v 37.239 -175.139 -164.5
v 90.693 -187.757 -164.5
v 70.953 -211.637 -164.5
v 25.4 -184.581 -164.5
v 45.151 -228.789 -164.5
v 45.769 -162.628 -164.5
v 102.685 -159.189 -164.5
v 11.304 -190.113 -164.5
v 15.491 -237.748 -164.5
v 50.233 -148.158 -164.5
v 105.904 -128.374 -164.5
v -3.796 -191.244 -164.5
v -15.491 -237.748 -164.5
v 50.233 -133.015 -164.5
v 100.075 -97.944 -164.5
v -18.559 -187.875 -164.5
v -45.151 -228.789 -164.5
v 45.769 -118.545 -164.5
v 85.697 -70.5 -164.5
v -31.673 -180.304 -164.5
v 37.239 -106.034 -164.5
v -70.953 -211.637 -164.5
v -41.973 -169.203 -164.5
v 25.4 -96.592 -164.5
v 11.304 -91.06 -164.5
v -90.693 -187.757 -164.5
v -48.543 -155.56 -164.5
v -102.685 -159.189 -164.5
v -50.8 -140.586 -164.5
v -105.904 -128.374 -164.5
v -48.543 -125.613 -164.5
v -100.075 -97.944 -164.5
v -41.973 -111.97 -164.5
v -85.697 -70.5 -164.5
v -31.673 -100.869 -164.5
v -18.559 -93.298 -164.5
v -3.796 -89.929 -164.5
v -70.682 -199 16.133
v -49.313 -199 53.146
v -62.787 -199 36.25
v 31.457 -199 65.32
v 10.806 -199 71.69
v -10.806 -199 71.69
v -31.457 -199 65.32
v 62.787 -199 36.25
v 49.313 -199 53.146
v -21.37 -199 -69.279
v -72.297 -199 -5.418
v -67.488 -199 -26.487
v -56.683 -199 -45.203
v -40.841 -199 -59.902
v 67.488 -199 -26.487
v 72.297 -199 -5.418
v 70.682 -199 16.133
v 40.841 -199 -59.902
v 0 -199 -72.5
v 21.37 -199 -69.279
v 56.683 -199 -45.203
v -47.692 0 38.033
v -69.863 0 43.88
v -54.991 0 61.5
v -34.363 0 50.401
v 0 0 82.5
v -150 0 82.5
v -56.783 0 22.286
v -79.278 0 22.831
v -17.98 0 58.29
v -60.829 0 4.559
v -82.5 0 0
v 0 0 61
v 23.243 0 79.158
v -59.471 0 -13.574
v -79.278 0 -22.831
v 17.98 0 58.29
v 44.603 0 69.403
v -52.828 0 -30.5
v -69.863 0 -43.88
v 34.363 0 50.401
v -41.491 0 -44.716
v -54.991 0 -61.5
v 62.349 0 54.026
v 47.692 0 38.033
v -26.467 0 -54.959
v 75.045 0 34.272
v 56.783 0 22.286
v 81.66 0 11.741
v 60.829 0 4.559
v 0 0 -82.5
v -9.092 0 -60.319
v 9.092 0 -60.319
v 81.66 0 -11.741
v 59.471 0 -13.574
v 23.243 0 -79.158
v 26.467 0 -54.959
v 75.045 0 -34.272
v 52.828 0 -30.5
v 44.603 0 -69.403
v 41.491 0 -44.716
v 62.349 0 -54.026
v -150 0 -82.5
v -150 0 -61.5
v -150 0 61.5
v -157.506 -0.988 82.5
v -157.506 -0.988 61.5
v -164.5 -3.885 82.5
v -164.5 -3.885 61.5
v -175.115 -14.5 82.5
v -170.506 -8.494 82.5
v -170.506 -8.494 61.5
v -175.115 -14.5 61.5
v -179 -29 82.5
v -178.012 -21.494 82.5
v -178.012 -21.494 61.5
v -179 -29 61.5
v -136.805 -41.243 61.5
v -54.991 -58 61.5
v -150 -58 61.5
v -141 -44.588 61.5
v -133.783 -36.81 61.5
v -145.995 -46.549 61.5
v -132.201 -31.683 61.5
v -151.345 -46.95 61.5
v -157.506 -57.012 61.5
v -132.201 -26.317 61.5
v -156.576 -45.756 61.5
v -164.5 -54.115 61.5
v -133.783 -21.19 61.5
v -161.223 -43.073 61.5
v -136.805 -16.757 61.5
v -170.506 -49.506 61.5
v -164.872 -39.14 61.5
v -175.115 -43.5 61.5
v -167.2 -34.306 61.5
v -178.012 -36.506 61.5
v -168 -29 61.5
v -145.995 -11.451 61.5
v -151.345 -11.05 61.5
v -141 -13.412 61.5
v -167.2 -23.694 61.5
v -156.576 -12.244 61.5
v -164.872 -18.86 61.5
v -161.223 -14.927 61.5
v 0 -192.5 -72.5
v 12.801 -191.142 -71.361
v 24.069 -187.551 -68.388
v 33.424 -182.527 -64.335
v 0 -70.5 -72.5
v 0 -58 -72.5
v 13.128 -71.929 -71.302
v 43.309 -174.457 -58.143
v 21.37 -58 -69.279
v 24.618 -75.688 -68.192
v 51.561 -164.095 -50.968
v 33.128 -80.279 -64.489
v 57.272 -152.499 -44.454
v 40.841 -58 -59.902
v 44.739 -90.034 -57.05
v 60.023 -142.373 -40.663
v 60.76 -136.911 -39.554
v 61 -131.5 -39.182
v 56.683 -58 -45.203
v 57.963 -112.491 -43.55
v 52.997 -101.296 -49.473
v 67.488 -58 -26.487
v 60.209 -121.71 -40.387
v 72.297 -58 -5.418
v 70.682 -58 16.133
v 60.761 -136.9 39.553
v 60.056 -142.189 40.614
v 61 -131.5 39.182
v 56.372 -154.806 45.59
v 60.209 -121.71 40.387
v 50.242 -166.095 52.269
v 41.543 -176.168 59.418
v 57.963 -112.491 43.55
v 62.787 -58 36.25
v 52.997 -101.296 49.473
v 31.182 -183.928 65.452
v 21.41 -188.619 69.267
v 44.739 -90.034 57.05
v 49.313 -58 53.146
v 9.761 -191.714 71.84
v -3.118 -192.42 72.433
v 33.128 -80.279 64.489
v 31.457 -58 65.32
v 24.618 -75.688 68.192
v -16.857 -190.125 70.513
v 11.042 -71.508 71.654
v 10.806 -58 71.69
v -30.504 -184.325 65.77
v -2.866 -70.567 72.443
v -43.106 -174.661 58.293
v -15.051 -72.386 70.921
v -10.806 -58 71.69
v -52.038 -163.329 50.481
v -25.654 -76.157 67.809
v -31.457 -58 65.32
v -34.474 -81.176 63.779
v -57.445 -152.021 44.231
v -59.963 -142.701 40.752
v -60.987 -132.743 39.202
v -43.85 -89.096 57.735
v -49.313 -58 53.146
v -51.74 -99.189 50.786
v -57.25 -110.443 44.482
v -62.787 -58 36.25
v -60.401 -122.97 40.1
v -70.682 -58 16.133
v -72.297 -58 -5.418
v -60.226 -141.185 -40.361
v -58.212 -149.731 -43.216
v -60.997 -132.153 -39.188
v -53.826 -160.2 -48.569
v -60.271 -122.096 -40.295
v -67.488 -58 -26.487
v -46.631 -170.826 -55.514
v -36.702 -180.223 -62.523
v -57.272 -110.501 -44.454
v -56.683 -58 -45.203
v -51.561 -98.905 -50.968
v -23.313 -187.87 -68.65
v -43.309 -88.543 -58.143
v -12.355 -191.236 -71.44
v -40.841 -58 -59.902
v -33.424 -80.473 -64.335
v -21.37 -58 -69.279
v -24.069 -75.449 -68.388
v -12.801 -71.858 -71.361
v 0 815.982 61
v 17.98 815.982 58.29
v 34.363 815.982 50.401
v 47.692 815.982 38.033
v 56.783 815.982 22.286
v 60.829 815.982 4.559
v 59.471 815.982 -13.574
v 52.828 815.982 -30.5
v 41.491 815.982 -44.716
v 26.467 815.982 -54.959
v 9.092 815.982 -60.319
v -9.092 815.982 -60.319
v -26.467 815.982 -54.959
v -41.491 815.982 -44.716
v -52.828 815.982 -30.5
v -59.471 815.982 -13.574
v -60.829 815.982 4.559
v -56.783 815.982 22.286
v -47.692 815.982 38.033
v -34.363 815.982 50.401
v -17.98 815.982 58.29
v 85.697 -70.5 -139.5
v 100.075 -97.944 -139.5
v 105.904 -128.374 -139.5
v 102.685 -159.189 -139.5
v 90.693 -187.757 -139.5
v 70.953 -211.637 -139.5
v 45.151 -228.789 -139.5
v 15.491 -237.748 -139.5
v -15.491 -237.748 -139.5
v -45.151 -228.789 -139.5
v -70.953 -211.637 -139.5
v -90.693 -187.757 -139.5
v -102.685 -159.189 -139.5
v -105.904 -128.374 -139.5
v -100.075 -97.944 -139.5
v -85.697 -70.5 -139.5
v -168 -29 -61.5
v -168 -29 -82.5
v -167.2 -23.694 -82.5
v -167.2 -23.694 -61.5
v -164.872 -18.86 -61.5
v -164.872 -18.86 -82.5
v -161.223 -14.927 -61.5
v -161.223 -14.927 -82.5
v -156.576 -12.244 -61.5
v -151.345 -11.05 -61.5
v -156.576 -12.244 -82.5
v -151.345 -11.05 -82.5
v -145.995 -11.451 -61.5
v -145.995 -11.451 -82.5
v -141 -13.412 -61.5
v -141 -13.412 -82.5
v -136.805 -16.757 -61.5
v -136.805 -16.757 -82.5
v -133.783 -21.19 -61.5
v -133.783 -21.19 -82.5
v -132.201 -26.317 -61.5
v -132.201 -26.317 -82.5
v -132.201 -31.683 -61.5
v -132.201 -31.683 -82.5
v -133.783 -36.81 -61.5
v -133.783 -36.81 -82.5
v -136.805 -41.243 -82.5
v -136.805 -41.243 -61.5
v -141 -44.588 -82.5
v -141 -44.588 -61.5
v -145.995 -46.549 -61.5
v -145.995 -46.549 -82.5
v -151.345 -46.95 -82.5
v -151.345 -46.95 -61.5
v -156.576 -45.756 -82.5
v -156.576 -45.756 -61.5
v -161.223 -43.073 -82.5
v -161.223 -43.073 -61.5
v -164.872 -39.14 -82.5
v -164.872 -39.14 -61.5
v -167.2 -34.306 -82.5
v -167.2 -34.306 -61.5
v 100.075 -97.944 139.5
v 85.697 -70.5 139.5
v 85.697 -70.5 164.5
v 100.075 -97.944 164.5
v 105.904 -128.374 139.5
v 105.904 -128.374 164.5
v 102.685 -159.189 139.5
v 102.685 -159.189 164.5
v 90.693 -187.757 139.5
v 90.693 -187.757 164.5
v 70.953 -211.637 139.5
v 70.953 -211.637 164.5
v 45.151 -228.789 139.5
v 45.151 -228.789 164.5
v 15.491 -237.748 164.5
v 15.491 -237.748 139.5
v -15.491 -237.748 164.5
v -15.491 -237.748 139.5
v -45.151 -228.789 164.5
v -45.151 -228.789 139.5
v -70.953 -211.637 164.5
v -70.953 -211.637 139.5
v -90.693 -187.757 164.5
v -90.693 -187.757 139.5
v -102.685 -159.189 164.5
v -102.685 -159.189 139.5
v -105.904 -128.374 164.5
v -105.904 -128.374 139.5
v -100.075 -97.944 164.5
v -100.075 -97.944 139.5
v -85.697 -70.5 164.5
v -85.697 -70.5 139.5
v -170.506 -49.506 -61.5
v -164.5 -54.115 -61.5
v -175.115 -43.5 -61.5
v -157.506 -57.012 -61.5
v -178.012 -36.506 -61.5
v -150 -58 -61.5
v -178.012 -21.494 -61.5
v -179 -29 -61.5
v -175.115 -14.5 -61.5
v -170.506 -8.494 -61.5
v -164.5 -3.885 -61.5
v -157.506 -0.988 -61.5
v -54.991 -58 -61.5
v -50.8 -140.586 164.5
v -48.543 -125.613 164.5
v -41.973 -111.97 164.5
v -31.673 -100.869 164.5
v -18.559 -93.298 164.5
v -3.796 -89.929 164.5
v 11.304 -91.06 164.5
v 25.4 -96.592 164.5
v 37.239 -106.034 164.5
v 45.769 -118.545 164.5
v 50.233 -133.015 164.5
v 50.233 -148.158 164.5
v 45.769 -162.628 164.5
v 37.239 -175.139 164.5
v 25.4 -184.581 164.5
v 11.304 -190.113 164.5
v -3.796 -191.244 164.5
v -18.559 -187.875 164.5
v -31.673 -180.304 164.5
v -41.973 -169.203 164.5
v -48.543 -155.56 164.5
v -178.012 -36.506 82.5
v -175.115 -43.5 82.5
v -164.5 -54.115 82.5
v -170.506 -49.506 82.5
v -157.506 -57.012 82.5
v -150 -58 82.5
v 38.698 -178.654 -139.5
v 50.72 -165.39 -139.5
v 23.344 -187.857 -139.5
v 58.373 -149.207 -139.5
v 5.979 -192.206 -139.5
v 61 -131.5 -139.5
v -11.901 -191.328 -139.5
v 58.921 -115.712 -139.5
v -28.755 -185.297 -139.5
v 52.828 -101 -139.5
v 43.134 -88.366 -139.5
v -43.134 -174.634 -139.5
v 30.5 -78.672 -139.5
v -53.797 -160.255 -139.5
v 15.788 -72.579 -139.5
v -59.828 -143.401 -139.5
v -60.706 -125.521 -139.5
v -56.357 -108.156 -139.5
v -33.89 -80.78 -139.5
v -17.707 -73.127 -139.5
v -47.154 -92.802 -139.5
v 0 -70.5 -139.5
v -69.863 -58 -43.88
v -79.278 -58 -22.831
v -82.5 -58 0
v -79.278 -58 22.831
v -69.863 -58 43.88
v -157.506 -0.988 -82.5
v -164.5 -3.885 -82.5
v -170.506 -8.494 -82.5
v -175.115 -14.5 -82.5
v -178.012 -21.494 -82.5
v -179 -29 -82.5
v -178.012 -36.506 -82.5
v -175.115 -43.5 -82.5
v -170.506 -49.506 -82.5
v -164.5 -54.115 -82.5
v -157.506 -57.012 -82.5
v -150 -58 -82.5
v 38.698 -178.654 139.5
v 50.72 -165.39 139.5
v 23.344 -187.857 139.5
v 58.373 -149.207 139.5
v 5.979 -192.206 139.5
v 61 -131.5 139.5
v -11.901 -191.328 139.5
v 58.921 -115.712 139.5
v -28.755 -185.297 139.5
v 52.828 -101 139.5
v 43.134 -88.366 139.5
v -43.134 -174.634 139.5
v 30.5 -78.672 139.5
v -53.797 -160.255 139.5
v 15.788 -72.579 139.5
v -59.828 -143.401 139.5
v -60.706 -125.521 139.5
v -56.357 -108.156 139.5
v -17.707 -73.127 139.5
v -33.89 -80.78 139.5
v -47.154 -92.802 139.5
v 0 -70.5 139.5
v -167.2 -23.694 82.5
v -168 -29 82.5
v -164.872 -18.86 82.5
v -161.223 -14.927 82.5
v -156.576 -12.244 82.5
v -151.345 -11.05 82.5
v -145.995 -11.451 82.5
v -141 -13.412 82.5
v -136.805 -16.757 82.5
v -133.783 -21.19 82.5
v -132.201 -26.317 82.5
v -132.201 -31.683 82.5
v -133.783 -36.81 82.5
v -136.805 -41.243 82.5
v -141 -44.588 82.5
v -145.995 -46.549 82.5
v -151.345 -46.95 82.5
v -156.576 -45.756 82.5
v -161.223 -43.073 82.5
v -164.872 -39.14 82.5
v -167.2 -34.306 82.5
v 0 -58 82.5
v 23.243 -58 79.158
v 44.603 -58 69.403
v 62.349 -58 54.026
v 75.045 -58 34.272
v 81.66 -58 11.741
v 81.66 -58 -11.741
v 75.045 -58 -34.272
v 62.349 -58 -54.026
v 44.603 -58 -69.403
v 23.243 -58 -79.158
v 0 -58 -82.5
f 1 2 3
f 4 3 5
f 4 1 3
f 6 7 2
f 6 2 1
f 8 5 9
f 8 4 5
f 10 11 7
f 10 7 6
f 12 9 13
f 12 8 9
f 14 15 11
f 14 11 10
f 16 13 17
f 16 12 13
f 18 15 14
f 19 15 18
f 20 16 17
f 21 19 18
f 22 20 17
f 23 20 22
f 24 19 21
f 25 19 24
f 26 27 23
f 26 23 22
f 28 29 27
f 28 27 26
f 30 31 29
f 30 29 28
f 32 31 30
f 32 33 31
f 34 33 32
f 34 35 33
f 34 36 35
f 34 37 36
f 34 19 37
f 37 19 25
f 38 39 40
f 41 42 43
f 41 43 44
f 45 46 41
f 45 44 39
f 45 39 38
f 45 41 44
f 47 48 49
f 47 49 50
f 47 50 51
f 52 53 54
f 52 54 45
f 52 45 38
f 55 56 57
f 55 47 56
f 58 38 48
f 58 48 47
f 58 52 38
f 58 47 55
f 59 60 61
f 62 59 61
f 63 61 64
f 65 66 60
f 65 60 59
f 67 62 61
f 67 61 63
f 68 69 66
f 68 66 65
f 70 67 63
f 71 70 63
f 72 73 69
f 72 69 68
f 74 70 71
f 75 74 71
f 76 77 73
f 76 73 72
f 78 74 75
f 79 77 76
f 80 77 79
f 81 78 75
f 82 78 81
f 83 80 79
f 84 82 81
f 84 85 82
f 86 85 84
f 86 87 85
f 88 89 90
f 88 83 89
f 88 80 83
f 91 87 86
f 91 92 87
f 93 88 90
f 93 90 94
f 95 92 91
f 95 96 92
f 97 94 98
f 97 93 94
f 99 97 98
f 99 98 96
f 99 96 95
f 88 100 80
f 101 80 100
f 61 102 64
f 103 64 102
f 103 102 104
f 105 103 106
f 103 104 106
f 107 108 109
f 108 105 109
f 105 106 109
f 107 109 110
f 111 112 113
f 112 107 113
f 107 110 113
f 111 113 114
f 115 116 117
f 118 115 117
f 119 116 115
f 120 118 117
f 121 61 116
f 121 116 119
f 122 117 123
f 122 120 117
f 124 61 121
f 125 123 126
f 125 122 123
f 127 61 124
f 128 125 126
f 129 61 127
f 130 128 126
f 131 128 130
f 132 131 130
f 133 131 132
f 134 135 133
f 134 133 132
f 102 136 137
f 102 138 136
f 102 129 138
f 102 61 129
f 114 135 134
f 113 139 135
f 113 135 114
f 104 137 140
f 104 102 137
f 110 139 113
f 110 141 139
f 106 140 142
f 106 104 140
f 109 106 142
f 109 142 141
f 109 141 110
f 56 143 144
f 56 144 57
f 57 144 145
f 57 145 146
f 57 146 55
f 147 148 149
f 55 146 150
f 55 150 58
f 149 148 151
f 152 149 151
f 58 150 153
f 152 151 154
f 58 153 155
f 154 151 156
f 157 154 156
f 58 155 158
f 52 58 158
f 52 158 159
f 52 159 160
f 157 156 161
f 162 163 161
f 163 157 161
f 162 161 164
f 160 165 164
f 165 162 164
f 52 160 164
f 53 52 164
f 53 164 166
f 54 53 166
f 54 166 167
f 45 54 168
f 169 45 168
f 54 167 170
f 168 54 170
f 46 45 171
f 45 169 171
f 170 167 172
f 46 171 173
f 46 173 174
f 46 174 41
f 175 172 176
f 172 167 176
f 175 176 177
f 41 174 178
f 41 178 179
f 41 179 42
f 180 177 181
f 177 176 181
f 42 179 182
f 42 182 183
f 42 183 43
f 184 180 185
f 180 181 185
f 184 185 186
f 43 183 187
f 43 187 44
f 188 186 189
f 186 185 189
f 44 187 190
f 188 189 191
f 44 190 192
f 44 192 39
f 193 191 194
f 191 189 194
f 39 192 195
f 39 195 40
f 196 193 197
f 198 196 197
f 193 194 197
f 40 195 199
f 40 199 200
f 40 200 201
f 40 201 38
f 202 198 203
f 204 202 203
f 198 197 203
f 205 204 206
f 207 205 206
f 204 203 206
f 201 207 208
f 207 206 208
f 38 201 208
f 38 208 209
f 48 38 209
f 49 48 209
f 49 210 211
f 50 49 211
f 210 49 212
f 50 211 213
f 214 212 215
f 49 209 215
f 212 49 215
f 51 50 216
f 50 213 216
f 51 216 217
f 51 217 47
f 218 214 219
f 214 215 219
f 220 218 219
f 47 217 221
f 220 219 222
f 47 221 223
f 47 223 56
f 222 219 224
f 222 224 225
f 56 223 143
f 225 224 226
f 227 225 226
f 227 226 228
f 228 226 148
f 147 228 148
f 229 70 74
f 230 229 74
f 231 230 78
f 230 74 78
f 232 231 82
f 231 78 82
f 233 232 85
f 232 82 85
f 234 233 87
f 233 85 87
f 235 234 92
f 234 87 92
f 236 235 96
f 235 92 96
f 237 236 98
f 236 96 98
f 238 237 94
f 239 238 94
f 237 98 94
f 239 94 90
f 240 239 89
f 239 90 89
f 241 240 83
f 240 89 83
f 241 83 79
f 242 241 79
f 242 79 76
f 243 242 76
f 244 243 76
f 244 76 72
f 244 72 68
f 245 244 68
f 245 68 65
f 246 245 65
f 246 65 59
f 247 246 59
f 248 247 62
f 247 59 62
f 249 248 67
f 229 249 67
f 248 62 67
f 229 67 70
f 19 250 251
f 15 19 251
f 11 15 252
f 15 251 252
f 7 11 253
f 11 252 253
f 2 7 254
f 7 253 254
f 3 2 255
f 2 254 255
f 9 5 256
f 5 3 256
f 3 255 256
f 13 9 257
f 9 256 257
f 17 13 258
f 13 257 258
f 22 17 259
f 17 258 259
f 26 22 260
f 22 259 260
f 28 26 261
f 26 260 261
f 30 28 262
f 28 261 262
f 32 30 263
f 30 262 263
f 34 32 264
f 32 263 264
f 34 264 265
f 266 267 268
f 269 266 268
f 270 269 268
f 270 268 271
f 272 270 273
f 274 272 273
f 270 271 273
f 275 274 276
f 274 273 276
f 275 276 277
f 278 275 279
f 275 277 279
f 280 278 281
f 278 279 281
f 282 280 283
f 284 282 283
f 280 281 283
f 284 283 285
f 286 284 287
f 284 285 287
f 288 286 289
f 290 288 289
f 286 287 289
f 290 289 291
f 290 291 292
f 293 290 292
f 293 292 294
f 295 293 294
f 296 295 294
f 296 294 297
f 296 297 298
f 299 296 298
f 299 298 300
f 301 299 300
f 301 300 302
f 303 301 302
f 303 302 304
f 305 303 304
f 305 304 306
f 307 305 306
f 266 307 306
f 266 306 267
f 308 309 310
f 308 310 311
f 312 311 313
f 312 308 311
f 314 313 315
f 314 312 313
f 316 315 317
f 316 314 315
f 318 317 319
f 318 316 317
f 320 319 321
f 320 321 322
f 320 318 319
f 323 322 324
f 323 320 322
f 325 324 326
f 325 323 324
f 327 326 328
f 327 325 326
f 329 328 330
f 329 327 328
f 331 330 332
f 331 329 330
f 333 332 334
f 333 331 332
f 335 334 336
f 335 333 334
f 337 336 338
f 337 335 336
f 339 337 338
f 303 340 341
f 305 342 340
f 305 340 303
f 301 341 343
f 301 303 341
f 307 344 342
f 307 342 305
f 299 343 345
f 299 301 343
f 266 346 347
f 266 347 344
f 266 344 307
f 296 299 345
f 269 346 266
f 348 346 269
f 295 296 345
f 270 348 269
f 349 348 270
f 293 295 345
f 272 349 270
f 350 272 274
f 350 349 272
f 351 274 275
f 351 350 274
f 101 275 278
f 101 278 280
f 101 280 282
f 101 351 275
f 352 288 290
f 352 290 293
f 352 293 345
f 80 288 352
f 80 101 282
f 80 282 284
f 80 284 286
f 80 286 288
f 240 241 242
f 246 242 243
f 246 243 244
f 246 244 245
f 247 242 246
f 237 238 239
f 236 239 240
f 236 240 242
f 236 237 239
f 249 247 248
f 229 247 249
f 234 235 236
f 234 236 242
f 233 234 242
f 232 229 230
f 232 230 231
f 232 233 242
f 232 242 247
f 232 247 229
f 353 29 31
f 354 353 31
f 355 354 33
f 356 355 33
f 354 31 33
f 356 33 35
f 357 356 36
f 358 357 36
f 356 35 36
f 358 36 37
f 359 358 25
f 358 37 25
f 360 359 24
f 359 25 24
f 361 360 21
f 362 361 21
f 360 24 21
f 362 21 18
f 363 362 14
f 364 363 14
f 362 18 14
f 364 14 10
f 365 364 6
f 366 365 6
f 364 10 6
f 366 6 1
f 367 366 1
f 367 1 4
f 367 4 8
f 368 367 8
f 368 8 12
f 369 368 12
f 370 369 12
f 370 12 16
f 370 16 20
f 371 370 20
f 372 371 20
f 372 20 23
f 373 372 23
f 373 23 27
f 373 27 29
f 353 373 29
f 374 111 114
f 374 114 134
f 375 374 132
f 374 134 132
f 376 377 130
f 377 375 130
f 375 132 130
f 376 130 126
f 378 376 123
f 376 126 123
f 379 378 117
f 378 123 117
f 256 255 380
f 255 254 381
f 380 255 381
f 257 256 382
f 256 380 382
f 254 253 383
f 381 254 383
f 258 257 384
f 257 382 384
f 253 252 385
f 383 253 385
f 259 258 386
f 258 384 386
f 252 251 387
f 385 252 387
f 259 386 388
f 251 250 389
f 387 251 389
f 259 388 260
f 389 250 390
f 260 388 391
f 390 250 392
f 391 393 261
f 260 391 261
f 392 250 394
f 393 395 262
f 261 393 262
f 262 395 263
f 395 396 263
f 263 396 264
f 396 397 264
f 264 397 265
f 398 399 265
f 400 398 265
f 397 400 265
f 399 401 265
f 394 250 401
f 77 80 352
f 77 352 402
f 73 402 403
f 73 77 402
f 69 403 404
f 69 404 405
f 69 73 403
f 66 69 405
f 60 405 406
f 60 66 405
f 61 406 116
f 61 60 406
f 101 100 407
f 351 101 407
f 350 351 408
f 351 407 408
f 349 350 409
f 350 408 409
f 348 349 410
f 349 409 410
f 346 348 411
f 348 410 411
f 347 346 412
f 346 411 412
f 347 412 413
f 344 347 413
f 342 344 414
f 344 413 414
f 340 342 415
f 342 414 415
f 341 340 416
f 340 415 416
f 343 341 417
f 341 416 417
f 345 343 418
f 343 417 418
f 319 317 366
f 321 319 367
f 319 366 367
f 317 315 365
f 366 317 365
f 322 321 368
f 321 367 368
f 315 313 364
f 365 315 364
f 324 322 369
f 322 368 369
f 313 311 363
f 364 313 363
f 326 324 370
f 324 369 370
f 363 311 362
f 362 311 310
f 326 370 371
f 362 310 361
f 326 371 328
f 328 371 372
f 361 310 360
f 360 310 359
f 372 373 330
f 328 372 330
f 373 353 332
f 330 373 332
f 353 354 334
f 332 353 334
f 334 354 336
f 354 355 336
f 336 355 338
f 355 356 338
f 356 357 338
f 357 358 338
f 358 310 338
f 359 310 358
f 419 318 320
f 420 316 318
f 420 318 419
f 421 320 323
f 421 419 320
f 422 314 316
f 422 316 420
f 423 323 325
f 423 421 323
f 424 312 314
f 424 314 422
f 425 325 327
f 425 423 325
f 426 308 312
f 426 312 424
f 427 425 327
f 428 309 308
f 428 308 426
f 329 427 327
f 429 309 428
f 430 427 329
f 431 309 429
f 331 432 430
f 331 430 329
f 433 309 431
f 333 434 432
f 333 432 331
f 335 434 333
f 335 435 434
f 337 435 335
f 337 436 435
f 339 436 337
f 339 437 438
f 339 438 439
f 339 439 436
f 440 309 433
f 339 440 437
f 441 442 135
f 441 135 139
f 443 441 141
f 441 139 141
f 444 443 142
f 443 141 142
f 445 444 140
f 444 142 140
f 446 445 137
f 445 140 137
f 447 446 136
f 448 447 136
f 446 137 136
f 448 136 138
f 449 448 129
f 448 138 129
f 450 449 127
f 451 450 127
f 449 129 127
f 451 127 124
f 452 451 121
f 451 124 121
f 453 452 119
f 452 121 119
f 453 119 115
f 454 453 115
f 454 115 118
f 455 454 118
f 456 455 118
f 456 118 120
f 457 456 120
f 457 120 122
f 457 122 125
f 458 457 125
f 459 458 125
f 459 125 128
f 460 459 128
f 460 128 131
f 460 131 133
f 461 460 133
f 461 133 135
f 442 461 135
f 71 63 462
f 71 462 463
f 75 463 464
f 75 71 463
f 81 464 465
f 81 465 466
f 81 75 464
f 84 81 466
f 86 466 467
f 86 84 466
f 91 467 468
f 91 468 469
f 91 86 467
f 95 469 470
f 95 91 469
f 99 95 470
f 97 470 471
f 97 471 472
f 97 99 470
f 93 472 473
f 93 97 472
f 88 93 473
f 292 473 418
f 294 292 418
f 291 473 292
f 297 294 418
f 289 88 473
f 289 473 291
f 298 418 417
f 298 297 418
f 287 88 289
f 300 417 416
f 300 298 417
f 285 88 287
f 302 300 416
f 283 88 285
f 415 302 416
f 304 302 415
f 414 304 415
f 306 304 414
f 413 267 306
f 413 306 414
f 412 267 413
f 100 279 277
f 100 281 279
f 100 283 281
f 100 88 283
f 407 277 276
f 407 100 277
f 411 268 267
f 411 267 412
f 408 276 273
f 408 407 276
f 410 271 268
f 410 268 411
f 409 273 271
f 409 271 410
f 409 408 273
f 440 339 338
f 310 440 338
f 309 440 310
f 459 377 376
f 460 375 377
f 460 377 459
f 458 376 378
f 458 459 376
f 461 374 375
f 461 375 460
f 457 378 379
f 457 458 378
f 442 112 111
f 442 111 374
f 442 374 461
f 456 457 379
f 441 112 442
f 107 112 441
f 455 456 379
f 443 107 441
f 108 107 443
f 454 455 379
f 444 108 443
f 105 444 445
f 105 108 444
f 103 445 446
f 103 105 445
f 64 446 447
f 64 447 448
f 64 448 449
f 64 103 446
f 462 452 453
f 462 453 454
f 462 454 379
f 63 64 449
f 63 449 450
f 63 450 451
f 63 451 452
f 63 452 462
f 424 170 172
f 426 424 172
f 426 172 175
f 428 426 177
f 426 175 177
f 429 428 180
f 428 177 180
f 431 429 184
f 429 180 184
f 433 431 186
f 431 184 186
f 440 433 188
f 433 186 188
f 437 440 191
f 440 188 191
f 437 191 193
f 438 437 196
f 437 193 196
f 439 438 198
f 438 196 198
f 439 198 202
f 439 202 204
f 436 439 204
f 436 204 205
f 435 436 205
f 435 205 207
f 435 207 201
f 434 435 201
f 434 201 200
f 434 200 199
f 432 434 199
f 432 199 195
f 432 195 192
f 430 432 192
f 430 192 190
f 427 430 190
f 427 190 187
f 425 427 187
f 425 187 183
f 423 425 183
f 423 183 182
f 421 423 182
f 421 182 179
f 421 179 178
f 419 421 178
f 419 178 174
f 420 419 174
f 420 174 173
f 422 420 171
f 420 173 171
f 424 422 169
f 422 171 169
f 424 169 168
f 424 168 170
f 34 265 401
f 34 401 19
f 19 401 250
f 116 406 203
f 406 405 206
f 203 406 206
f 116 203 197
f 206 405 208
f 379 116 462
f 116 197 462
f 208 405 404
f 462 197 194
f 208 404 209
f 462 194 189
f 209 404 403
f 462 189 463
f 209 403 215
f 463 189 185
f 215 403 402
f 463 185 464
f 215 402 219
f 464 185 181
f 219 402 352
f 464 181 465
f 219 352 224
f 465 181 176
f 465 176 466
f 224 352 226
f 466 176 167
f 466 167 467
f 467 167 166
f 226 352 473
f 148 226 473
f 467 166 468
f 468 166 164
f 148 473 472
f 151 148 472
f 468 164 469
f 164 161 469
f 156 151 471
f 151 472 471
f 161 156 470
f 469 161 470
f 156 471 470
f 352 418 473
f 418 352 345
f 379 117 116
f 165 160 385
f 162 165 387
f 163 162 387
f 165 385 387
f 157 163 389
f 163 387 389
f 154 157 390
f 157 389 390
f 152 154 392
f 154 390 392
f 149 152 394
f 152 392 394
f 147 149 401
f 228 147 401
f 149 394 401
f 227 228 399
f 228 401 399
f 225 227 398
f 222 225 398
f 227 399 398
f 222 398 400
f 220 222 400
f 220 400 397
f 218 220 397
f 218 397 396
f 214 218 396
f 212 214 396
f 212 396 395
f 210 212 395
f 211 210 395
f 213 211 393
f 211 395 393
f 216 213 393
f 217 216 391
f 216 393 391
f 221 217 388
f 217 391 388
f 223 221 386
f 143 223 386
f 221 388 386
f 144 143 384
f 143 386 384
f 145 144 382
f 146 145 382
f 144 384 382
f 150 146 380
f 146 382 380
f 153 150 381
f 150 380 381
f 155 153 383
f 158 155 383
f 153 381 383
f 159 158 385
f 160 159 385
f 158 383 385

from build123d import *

# Parameters (mm, degrees)
SKETCH1_R                = 61
BOSS_EXTRUDE1_DEPTH      = 815.982336818
BOSS_EXTRUDE2_DEPTH      = 58
CUT_EXTRUDE1_DEPTH       = 493
CUT_EXTRUDE2_DEPTH       = 493
BOSS_EXTRUDE3_DEPTH      = 139.5
BOSS_EXTRUDE3_DEPTH_BACK = 139.5
SKETCH6_R                = 61
SKETCH7_R                = 106
BOSS_EXTRUDE5_DEPTH      = 25
CUT_EXTRUDE3_DEPTH       = 51
SKETCH9_R                = 72.5
BOSS_EXTRUDE6_DEPTH      = 141
SKETCH11_R               = 38.5
CUT_EXTRUDE6_DEPTH       = 450
SKETCH12_R               = 50.8
CUT_EXTRUDE7_DEPTH       = 630


with BuildPart() as part:
    # Sketch1 → Boss-Extrude1 (new body)
    with BuildSketch(Plane(origin=(0, 0, 0), x_dir=(1, 0, 0), z_dir=(0, 1, 0))):
        Circle(SKETCH1_R)
    extrude(amount=BOSS_EXTRUDE1_DEPTH)

    # Sketch2 → Boss-Extrude2 (add)
    with BuildSketch(Plane(origin=(0, 0, 0), x_dir=(-1, 0, 0), z_dir=(0, -1, 0))):
        with BuildLine():
            Line((0, 82.5), (179, 82.5))
            Line((179, 82.5), (179, 61.5))
            Line((179, 61.5), (54.990908339, 61.5))
            ThreePointArc((54.990908339, 61.5), (82.5, 0), (54.990908339, -61.5))
            Line((54.990908339, -61.5), (179, -61.5))
            Line((179, -61.5), (179, -82.5))
            Line((179, -82.5), (0, -82.5))
            ThreePointArc((0, -82.5), (-82.5, 0), (0, 82.5))
        make_face()
    extrude(amount=BOSS_EXTRUDE2_DEPTH)

    # Sketch3 → Cut-Extrude1 (cut)
    with BuildSketch(Plane(origin=(0, 0, -82.5), x_dir=(-1, 0, 0), z_dir=(0, 0, -1))):
        with BuildLine():
            Line((179, 0), (150, 0))
            ThreePointArc((150, 0), (170.506096654, -8.493903346), (179, -29))
            Line((179, -29), (179, 0))
        make_face()
        with BuildLine():
            ThreePointArc((179, -29), (170.506096654, -49.506096654), (150, -58))
            Line((150, -58), (179, -58))
            Line((179, -58), (179, -29))
        make_face()
    extrude(amount=-CUT_EXTRUDE1_DEPTH, mode=Mode.SUBTRACT)

    # Sketch3<3> → Cut-Extrude2 (cut)
    with BuildSketch(Plane(origin=(0, 0, -82.5), x_dir=(-1, 0, 0), z_dir=(0, 0, -1))):
        with BuildLine():
            ThreePointArc((168, -29), (150, -11), (132, -29))
            ThreePointArc((132, -29), (150, -47), (168, -29))
        make_face()
    extrude(amount=-CUT_EXTRUDE2_DEPTH, mode=Mode.SUBTRACT)



with BuildPart() as body_2:
    # Sketch6 → Boss-Extrude3 (new, two sides: drawn at the far end of the back side and taken through both)
    with BuildSketch(Plane.XY.offset(-BOSS_EXTRUDE3_DEPTH_BACK)):
        with Locations((0, -131.5)):
            Circle(SKETCH6_R)
    extrude(amount=BOSS_EXTRUDE3_DEPTH + BOSS_EXTRUDE3_DEPTH_BACK)

    # Sketch7 → Boss-Extrude5 (add)
    with BuildSketch(Plane(origin=(0, 0, -139.5), x_dir=(-1, 0, 0), z_dir=(0, 0, -1))):
        with Locations((0, -132.886327958)):
            Circle(SKETCH7_R)
    boss_extrude5 = extrude(amount=BOSS_EXTRUDE5_DEPTH)

    # Sketch8 → Cut-Extrude3 (cut)
    with BuildSketch(Plane.XY.offset(-139.5)):
        Polygon((0, -70.5), (144.590777868, -70.5), (144.590777868, 11.025223161), (-136.314365489, 11.025223161), (-136.314365489, -70.5), align=None)
    cut_extrude3 = extrude(amount=-CUT_EXTRUDE3_DEPTH, mode=Mode.SUBTRACT)

    # Mirror1: Boss-Extrude5, Cut-Extrude3 across plane
    add(boss_extrude5.mirror(Plane.XY))
    add(cut_extrude3.mirror(Plane.XY), mode=Mode.SUBTRACT)


with BuildPart() as part_1:
    add(part.part)

    add(body_2.part)  # Boss-Extrude6 merges body 2
    # Sketch9 → Boss-Extrude6 (add)
    with BuildSketch(Plane.XZ.offset(58)):
        Circle(SKETCH9_R)
    extrude(amount=BOSS_EXTRUDE6_DEPTH)

    # Sketch11 → Cut-Extrude6 (cut)
    with BuildSketch(Plane(origin=(0, 0, -164.5), x_dir=(-1, 0, 0), z_dir=(0, 0, -1))):
        with Locations((0, -141.739564151)):
            Circle(SKETCH11_R)
    extrude(amount=-CUT_EXTRUDE6_DEPTH, mode=Mode.SUBTRACT)

    # Sketch12 → Cut-Extrude7 (cut)
    with BuildSketch(Plane(origin=(0, 0, -164.5), x_dir=(-1, 0, 0), z_dir=(0, 0, -1))):
        with Locations((0, -140.586472034)):
            Circle(SKETCH12_R)
    extrude(amount=-CUT_EXTRUDE7_DEPTH, mode=Mode.SUBTRACT)


solid = part_1.part
